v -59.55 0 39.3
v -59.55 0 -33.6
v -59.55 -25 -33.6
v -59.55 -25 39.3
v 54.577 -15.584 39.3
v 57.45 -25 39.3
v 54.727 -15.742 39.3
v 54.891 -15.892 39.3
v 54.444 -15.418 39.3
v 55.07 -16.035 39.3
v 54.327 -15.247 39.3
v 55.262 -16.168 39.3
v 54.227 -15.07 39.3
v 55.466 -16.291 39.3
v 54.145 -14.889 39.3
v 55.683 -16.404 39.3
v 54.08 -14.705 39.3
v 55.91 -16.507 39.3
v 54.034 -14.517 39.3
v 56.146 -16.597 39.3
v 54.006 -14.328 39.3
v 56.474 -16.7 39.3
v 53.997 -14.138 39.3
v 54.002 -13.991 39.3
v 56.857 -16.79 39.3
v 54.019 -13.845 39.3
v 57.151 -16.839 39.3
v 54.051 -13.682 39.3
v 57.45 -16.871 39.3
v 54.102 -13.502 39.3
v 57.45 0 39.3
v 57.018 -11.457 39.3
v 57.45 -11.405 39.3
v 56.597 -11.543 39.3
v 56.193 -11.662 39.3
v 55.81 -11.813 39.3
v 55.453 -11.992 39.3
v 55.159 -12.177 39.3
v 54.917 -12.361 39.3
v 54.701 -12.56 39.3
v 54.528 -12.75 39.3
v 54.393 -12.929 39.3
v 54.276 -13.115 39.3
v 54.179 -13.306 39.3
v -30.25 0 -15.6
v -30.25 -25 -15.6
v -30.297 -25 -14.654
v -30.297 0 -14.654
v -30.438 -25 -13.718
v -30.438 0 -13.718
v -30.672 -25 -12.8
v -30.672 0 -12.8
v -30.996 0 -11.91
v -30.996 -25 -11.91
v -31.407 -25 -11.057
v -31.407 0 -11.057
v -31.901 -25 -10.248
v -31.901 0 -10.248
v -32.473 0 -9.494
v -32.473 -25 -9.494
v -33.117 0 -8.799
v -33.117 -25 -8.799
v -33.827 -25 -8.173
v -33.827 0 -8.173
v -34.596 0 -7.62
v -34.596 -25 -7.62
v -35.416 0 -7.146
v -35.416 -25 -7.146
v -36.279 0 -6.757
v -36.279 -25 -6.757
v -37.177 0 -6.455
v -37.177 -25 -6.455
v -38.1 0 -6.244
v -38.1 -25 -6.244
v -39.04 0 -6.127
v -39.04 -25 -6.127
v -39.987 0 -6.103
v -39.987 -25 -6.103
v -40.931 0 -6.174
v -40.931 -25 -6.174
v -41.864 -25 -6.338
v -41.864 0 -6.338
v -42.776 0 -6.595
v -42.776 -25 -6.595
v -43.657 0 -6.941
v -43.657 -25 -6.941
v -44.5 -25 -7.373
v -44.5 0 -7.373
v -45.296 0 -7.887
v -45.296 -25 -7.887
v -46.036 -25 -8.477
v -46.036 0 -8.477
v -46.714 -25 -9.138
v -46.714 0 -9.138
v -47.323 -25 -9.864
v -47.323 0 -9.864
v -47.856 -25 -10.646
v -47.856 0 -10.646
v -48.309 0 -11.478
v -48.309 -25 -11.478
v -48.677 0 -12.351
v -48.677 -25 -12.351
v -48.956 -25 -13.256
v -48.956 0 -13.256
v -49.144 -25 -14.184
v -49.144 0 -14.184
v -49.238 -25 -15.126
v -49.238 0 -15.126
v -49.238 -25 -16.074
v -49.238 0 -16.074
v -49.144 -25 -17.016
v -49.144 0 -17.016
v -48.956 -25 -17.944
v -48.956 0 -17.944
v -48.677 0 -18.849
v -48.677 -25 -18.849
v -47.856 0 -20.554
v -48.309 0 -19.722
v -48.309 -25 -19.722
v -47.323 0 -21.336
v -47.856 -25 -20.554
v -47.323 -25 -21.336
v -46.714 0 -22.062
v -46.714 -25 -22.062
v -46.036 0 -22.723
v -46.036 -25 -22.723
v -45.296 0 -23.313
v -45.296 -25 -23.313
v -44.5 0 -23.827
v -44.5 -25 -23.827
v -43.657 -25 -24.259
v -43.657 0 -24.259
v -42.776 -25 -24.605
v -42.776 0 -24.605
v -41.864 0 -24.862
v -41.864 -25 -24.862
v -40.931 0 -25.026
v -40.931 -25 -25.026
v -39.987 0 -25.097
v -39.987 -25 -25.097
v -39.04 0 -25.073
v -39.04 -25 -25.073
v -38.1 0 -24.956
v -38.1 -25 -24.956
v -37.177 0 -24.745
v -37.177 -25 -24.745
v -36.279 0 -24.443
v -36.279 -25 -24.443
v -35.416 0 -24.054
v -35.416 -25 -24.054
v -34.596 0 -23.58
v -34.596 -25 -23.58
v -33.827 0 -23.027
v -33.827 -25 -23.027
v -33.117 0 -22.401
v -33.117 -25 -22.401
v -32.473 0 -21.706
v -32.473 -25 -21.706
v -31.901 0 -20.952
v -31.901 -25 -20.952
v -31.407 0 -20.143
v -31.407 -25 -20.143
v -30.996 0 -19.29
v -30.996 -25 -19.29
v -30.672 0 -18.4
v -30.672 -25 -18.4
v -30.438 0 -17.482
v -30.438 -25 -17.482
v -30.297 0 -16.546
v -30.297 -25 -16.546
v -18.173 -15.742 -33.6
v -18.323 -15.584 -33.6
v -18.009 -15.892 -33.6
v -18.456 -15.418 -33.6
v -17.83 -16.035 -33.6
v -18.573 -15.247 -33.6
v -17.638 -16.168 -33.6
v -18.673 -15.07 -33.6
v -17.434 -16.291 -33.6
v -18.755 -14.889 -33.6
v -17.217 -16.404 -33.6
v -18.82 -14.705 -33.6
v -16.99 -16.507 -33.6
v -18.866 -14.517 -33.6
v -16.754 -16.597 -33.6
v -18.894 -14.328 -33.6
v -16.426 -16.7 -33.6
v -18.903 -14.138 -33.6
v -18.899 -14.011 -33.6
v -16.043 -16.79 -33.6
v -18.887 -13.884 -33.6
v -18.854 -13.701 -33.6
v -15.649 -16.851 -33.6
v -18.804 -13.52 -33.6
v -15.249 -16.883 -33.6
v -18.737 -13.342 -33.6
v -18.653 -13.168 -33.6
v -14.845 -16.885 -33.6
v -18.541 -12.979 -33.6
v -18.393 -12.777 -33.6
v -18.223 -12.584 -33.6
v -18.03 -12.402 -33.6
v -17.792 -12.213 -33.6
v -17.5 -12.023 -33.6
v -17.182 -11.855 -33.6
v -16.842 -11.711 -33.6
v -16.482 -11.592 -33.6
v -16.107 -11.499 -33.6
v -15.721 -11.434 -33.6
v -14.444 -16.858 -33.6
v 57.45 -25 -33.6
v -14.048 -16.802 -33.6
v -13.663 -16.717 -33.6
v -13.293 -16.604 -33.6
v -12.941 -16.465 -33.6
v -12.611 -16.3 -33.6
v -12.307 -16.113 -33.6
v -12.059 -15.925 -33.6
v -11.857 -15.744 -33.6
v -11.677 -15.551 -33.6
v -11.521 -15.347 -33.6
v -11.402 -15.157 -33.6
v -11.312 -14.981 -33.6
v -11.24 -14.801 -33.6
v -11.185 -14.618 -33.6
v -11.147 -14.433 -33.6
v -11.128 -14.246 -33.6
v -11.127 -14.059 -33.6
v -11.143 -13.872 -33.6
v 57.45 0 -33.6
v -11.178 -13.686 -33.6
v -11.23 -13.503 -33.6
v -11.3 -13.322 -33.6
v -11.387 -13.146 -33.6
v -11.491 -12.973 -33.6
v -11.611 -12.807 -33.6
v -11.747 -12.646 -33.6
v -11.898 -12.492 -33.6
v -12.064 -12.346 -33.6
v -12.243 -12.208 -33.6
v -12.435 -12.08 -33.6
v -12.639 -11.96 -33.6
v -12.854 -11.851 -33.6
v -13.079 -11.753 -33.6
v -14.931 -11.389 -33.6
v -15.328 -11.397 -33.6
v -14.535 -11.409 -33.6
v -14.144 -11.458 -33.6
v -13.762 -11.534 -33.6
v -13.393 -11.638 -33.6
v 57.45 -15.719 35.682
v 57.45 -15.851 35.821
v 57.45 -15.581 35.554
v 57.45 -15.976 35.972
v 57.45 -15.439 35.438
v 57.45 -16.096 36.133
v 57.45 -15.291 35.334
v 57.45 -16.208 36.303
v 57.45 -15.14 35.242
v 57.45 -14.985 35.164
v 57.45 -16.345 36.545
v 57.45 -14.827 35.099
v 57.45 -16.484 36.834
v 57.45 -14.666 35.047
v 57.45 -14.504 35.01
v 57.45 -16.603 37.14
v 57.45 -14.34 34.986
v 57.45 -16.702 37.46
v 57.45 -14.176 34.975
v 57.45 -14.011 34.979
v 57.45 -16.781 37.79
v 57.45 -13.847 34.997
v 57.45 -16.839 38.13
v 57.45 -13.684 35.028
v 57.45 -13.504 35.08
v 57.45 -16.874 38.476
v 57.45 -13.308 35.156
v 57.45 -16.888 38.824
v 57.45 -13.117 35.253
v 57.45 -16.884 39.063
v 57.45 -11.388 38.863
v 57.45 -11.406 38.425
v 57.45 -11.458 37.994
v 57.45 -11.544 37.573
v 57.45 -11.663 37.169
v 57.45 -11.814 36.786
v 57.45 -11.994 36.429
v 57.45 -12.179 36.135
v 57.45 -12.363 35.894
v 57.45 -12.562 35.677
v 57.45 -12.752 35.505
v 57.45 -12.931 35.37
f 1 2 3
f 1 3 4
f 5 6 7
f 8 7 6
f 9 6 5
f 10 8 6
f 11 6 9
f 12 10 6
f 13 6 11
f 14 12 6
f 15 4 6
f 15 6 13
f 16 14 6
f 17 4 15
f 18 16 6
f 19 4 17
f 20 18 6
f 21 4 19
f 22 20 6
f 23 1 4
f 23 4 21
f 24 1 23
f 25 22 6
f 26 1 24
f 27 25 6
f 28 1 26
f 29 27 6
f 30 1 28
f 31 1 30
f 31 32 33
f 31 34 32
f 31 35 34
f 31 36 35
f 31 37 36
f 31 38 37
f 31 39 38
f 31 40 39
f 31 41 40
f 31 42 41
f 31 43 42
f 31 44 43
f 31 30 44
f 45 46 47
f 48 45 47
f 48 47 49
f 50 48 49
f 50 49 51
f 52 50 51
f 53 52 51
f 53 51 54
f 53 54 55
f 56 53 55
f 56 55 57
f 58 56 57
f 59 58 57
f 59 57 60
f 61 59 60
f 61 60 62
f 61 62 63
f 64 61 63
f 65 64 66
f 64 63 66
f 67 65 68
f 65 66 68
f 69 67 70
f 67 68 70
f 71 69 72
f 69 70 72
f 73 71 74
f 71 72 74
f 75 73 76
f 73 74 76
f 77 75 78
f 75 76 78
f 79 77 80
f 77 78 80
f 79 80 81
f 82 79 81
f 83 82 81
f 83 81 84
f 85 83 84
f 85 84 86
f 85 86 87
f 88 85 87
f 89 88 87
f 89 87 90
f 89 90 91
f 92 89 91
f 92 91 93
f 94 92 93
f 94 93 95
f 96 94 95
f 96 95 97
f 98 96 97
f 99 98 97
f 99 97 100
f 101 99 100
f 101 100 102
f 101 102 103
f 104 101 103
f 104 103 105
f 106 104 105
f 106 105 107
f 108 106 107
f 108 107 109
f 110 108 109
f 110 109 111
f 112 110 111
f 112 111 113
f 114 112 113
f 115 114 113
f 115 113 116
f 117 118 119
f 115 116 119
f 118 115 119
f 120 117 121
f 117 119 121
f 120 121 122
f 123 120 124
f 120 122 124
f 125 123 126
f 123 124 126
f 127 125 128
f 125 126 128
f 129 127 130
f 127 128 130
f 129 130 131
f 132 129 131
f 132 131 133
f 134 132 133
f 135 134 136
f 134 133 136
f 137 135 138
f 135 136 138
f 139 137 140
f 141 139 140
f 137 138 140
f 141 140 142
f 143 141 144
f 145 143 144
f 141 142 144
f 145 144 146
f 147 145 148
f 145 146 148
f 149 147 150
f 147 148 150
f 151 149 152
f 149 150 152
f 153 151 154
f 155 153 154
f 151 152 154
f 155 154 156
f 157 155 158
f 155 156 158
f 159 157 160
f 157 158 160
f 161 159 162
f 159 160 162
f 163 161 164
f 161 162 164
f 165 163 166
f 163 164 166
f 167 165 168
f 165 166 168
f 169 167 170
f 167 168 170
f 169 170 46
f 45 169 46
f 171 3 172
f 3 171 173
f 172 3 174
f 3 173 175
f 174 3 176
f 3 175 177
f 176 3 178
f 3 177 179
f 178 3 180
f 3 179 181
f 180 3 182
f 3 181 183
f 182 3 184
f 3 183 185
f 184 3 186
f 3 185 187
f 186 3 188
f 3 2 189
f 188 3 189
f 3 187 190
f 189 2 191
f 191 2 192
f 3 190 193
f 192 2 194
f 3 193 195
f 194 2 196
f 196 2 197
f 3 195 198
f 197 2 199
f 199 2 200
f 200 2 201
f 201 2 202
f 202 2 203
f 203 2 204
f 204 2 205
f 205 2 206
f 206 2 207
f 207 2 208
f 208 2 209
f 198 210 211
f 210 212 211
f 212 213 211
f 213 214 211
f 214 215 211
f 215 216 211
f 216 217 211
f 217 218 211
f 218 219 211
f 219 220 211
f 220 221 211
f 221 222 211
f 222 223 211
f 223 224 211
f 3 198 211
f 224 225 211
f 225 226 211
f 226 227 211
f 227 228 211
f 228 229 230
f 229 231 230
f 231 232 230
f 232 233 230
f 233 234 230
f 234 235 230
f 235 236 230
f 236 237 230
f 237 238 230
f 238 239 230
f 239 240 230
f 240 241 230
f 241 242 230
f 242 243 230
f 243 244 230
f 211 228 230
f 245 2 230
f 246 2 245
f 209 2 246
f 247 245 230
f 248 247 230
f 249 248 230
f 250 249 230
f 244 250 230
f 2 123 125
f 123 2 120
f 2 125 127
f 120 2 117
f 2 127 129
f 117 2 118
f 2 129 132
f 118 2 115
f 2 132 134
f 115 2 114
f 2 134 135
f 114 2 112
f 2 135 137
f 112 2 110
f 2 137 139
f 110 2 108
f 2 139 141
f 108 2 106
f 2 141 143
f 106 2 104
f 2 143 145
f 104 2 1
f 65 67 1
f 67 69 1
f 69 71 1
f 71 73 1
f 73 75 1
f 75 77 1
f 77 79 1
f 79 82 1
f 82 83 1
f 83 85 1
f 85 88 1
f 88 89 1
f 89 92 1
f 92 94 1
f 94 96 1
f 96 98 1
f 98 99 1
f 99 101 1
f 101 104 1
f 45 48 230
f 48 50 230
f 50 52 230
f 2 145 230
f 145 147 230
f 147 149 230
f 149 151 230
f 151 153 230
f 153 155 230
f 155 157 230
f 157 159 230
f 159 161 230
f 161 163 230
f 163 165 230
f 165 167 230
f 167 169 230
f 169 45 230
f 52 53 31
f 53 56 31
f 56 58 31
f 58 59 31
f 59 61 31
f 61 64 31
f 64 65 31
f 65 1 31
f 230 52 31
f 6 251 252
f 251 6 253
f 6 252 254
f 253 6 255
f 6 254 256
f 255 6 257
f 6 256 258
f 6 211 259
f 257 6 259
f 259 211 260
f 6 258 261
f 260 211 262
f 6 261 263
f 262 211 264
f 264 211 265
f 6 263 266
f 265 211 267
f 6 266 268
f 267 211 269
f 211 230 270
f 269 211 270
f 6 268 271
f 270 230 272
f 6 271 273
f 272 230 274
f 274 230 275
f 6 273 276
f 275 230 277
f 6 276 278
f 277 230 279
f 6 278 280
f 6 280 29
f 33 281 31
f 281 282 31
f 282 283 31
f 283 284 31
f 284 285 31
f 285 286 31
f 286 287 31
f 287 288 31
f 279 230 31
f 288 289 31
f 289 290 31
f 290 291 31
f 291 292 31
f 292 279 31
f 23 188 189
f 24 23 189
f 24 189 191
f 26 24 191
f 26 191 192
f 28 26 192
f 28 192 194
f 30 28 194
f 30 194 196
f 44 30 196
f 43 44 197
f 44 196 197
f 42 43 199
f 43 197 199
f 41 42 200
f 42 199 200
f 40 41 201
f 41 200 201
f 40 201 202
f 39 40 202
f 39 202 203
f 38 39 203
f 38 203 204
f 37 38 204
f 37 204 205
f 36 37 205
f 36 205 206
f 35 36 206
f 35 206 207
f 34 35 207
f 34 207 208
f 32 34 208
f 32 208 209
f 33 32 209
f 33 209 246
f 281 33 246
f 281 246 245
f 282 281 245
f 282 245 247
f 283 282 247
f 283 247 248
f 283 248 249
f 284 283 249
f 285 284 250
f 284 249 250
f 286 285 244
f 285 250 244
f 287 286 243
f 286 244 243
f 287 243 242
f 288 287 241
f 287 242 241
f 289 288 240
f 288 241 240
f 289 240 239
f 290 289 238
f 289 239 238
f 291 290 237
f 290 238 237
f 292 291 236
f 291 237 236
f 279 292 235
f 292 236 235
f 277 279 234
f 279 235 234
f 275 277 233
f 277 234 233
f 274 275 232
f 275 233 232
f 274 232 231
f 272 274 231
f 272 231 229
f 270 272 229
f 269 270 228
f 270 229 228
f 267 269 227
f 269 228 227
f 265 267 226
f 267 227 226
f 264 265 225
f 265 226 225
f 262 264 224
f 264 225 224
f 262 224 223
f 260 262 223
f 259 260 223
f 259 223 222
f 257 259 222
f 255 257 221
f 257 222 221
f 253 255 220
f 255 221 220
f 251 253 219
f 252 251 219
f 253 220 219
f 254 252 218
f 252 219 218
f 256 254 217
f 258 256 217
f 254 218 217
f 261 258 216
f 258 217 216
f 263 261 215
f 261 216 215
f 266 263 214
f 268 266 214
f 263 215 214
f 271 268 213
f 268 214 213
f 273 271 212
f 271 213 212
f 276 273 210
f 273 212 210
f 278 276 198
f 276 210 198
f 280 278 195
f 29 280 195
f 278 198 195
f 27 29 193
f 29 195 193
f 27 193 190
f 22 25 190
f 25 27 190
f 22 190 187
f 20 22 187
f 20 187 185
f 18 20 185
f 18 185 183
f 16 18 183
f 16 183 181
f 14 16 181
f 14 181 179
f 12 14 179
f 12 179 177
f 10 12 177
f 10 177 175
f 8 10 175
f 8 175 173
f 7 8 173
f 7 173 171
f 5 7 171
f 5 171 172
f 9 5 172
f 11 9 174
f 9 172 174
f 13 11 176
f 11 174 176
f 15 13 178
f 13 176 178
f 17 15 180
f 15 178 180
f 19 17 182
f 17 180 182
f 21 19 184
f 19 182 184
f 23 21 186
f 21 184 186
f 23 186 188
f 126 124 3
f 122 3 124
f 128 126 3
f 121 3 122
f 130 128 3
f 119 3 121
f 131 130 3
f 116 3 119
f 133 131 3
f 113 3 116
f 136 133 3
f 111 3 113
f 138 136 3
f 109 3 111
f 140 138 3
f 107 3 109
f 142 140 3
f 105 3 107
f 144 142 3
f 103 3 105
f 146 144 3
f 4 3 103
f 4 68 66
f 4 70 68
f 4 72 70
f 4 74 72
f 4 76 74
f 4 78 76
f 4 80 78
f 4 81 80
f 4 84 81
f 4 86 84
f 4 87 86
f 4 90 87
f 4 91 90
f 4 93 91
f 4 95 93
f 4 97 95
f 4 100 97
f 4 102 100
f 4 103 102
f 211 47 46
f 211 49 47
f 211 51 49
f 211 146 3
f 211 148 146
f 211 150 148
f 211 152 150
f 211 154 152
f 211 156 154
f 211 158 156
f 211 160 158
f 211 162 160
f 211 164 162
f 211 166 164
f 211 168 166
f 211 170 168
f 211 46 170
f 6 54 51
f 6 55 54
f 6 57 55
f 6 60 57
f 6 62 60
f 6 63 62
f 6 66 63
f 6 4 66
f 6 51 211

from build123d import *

# Parameters (mm, degrees)
F0_W     = 117.000002
F0_H     = 72.900005
F1_DEPTH = 25
F4_D     = 5.5
F5_R     = 9.5
F6_DEPTH = 40


with BuildPart() as f1:
    # F0 (on Front) → F1 (new body)
    with BuildSketch(Plane.XZ):
        with Locations((-1.050001, 2.849999)):
            Rectangle(F0_W, F0_H)
    extrude(amount=F1_DEPTH)

    # F4 (through all)
    with Locations(Plane(origin=(48.375001, 0, 48.375001), x_dir=(0.707107, 0, -0.707107), z_dir=(0.707107, 0, 0.707107))):
        with Locations((13.142212, -14.138062)):
            Hole(F4_D / 2)

    # F5 (on face) → F6 (cut)
    with BuildSketch(Plane.XZ.offset(25)):
        with Locations((-39.750002, -15.600001)):
            Circle(F5_R)
    extrude(amount=-F6_DEPTH, mode=Mode.SUBTRACT)


solid = f1.part
